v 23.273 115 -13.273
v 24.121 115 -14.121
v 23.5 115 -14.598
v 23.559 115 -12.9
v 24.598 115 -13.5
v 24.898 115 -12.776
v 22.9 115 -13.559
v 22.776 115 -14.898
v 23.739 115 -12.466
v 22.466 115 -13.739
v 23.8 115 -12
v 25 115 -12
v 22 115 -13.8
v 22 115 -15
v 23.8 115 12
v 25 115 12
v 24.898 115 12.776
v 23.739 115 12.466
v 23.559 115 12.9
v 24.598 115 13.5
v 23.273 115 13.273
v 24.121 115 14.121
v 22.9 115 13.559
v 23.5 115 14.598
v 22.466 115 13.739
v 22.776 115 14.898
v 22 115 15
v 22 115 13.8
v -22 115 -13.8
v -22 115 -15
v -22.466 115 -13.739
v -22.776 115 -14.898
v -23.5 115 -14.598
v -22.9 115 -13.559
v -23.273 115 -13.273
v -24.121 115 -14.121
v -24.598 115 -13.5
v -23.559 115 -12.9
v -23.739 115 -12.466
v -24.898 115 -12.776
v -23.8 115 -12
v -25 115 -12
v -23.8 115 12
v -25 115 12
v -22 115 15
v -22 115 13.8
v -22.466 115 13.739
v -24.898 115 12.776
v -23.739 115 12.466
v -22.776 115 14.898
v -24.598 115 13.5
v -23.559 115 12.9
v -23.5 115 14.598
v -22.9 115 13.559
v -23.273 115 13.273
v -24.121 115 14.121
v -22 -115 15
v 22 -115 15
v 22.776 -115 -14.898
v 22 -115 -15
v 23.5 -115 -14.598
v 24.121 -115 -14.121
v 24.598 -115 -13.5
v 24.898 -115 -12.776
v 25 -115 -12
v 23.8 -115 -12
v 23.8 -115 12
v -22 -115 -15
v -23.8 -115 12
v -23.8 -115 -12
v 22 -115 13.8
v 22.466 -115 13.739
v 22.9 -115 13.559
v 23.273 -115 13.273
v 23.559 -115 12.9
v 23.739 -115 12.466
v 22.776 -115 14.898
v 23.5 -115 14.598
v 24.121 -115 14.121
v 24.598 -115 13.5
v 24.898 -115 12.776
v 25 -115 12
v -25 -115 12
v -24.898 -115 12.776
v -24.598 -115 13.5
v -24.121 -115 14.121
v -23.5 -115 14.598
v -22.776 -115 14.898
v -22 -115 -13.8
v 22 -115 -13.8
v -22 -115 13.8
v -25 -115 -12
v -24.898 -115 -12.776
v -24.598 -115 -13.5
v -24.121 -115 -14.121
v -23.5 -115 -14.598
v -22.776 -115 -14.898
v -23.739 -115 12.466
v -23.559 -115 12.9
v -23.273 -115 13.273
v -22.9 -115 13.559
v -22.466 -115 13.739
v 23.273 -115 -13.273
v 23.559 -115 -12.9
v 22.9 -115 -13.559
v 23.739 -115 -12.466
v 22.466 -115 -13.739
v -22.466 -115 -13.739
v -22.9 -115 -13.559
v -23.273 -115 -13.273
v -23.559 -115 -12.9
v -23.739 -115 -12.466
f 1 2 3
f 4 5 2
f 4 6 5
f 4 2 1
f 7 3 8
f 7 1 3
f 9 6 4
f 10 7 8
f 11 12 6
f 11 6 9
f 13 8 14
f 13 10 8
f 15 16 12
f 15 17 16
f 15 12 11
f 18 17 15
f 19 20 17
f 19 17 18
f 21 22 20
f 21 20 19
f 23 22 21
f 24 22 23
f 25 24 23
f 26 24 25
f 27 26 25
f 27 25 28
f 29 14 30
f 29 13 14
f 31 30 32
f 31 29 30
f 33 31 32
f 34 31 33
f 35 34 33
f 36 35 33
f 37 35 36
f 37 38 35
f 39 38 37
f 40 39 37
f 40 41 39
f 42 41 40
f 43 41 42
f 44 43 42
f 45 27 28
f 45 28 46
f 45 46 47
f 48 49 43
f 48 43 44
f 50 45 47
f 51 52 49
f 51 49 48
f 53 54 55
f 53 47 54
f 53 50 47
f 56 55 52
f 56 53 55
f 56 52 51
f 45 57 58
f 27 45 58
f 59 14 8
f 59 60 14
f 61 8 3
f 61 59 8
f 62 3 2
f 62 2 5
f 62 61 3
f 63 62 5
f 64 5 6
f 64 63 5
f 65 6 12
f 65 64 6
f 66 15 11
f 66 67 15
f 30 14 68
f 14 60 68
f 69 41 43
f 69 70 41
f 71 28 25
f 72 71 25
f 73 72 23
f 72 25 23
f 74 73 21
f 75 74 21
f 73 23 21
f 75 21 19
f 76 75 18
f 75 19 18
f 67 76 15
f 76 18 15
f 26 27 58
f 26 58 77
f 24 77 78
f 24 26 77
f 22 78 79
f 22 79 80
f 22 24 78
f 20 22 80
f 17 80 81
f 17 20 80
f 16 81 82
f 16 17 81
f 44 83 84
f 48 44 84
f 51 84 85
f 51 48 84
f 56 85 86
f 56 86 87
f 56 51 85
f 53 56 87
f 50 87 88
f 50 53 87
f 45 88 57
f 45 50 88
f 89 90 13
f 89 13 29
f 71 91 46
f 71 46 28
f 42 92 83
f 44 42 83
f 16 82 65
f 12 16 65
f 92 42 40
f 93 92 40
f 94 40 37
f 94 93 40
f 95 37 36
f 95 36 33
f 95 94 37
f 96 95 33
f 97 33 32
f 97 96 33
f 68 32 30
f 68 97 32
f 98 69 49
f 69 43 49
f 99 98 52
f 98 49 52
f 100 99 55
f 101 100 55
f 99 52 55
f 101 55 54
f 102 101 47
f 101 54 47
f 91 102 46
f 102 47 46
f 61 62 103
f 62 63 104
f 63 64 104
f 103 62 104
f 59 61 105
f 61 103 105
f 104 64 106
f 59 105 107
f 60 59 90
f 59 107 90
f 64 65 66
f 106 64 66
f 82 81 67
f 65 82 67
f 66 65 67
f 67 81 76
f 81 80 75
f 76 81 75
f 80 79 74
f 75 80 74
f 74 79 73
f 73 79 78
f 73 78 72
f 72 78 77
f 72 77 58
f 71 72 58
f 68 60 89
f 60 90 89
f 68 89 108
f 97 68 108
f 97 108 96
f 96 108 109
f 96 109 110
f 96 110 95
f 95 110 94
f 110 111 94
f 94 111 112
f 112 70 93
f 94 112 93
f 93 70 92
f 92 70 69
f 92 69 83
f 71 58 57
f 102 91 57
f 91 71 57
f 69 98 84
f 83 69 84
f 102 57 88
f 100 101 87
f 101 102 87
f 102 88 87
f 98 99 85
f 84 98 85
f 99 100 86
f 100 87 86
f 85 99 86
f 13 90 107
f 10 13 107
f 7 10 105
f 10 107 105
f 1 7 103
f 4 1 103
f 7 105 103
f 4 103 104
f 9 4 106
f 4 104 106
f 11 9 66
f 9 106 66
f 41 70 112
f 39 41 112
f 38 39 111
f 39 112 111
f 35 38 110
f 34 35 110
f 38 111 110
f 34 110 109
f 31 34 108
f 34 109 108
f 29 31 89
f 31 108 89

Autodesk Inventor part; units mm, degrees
ref_plane "YZ Plane" through (0, 0, 0) normal (1, 0, 0) x (0, 1, 0)
ref_plane "XZ Plane" through (0, 0, 0) normal (0, 1, 0) x (-1, 0, 0)
ref_plane "XY Plane" through (0, 0, 0) normal (0, 0, 1) x (1, 0, 0)
sketch "Sketch1" plane through (0, 0, 0) normal (0, 1, 0) x (-1, 0, 0)
  line L0 (25, 15) -> (-25, 15)
  line L1 (-25, 15) -> (-25, -15)
  line L2 (-25, -15) -> (25, -15)
  line L3 (25, -15) -> (25, 15)
  line L4 (25, 15) -> (-25, -15) construction
  line L5 (-25, 15) -> (25, -15) construction
  point P0 (0, 0)
  dimension "d0" = 50
  dimension "d1" = 30
extrude "Extrusion1" add sketch "Sketch1" along normal mid plane 230
fillet "Fillet1" radius 3 4 edges at (25, 0, 15) (25, 0, -15) (-25, 0, 15) (-25, 0, -15)
shell "Shell1" thickness 1.2 removed faces 2 at (-7.3333, 115, -5) at (-7.3333, -115, -5)
properties part number "Perfil 30x501"
